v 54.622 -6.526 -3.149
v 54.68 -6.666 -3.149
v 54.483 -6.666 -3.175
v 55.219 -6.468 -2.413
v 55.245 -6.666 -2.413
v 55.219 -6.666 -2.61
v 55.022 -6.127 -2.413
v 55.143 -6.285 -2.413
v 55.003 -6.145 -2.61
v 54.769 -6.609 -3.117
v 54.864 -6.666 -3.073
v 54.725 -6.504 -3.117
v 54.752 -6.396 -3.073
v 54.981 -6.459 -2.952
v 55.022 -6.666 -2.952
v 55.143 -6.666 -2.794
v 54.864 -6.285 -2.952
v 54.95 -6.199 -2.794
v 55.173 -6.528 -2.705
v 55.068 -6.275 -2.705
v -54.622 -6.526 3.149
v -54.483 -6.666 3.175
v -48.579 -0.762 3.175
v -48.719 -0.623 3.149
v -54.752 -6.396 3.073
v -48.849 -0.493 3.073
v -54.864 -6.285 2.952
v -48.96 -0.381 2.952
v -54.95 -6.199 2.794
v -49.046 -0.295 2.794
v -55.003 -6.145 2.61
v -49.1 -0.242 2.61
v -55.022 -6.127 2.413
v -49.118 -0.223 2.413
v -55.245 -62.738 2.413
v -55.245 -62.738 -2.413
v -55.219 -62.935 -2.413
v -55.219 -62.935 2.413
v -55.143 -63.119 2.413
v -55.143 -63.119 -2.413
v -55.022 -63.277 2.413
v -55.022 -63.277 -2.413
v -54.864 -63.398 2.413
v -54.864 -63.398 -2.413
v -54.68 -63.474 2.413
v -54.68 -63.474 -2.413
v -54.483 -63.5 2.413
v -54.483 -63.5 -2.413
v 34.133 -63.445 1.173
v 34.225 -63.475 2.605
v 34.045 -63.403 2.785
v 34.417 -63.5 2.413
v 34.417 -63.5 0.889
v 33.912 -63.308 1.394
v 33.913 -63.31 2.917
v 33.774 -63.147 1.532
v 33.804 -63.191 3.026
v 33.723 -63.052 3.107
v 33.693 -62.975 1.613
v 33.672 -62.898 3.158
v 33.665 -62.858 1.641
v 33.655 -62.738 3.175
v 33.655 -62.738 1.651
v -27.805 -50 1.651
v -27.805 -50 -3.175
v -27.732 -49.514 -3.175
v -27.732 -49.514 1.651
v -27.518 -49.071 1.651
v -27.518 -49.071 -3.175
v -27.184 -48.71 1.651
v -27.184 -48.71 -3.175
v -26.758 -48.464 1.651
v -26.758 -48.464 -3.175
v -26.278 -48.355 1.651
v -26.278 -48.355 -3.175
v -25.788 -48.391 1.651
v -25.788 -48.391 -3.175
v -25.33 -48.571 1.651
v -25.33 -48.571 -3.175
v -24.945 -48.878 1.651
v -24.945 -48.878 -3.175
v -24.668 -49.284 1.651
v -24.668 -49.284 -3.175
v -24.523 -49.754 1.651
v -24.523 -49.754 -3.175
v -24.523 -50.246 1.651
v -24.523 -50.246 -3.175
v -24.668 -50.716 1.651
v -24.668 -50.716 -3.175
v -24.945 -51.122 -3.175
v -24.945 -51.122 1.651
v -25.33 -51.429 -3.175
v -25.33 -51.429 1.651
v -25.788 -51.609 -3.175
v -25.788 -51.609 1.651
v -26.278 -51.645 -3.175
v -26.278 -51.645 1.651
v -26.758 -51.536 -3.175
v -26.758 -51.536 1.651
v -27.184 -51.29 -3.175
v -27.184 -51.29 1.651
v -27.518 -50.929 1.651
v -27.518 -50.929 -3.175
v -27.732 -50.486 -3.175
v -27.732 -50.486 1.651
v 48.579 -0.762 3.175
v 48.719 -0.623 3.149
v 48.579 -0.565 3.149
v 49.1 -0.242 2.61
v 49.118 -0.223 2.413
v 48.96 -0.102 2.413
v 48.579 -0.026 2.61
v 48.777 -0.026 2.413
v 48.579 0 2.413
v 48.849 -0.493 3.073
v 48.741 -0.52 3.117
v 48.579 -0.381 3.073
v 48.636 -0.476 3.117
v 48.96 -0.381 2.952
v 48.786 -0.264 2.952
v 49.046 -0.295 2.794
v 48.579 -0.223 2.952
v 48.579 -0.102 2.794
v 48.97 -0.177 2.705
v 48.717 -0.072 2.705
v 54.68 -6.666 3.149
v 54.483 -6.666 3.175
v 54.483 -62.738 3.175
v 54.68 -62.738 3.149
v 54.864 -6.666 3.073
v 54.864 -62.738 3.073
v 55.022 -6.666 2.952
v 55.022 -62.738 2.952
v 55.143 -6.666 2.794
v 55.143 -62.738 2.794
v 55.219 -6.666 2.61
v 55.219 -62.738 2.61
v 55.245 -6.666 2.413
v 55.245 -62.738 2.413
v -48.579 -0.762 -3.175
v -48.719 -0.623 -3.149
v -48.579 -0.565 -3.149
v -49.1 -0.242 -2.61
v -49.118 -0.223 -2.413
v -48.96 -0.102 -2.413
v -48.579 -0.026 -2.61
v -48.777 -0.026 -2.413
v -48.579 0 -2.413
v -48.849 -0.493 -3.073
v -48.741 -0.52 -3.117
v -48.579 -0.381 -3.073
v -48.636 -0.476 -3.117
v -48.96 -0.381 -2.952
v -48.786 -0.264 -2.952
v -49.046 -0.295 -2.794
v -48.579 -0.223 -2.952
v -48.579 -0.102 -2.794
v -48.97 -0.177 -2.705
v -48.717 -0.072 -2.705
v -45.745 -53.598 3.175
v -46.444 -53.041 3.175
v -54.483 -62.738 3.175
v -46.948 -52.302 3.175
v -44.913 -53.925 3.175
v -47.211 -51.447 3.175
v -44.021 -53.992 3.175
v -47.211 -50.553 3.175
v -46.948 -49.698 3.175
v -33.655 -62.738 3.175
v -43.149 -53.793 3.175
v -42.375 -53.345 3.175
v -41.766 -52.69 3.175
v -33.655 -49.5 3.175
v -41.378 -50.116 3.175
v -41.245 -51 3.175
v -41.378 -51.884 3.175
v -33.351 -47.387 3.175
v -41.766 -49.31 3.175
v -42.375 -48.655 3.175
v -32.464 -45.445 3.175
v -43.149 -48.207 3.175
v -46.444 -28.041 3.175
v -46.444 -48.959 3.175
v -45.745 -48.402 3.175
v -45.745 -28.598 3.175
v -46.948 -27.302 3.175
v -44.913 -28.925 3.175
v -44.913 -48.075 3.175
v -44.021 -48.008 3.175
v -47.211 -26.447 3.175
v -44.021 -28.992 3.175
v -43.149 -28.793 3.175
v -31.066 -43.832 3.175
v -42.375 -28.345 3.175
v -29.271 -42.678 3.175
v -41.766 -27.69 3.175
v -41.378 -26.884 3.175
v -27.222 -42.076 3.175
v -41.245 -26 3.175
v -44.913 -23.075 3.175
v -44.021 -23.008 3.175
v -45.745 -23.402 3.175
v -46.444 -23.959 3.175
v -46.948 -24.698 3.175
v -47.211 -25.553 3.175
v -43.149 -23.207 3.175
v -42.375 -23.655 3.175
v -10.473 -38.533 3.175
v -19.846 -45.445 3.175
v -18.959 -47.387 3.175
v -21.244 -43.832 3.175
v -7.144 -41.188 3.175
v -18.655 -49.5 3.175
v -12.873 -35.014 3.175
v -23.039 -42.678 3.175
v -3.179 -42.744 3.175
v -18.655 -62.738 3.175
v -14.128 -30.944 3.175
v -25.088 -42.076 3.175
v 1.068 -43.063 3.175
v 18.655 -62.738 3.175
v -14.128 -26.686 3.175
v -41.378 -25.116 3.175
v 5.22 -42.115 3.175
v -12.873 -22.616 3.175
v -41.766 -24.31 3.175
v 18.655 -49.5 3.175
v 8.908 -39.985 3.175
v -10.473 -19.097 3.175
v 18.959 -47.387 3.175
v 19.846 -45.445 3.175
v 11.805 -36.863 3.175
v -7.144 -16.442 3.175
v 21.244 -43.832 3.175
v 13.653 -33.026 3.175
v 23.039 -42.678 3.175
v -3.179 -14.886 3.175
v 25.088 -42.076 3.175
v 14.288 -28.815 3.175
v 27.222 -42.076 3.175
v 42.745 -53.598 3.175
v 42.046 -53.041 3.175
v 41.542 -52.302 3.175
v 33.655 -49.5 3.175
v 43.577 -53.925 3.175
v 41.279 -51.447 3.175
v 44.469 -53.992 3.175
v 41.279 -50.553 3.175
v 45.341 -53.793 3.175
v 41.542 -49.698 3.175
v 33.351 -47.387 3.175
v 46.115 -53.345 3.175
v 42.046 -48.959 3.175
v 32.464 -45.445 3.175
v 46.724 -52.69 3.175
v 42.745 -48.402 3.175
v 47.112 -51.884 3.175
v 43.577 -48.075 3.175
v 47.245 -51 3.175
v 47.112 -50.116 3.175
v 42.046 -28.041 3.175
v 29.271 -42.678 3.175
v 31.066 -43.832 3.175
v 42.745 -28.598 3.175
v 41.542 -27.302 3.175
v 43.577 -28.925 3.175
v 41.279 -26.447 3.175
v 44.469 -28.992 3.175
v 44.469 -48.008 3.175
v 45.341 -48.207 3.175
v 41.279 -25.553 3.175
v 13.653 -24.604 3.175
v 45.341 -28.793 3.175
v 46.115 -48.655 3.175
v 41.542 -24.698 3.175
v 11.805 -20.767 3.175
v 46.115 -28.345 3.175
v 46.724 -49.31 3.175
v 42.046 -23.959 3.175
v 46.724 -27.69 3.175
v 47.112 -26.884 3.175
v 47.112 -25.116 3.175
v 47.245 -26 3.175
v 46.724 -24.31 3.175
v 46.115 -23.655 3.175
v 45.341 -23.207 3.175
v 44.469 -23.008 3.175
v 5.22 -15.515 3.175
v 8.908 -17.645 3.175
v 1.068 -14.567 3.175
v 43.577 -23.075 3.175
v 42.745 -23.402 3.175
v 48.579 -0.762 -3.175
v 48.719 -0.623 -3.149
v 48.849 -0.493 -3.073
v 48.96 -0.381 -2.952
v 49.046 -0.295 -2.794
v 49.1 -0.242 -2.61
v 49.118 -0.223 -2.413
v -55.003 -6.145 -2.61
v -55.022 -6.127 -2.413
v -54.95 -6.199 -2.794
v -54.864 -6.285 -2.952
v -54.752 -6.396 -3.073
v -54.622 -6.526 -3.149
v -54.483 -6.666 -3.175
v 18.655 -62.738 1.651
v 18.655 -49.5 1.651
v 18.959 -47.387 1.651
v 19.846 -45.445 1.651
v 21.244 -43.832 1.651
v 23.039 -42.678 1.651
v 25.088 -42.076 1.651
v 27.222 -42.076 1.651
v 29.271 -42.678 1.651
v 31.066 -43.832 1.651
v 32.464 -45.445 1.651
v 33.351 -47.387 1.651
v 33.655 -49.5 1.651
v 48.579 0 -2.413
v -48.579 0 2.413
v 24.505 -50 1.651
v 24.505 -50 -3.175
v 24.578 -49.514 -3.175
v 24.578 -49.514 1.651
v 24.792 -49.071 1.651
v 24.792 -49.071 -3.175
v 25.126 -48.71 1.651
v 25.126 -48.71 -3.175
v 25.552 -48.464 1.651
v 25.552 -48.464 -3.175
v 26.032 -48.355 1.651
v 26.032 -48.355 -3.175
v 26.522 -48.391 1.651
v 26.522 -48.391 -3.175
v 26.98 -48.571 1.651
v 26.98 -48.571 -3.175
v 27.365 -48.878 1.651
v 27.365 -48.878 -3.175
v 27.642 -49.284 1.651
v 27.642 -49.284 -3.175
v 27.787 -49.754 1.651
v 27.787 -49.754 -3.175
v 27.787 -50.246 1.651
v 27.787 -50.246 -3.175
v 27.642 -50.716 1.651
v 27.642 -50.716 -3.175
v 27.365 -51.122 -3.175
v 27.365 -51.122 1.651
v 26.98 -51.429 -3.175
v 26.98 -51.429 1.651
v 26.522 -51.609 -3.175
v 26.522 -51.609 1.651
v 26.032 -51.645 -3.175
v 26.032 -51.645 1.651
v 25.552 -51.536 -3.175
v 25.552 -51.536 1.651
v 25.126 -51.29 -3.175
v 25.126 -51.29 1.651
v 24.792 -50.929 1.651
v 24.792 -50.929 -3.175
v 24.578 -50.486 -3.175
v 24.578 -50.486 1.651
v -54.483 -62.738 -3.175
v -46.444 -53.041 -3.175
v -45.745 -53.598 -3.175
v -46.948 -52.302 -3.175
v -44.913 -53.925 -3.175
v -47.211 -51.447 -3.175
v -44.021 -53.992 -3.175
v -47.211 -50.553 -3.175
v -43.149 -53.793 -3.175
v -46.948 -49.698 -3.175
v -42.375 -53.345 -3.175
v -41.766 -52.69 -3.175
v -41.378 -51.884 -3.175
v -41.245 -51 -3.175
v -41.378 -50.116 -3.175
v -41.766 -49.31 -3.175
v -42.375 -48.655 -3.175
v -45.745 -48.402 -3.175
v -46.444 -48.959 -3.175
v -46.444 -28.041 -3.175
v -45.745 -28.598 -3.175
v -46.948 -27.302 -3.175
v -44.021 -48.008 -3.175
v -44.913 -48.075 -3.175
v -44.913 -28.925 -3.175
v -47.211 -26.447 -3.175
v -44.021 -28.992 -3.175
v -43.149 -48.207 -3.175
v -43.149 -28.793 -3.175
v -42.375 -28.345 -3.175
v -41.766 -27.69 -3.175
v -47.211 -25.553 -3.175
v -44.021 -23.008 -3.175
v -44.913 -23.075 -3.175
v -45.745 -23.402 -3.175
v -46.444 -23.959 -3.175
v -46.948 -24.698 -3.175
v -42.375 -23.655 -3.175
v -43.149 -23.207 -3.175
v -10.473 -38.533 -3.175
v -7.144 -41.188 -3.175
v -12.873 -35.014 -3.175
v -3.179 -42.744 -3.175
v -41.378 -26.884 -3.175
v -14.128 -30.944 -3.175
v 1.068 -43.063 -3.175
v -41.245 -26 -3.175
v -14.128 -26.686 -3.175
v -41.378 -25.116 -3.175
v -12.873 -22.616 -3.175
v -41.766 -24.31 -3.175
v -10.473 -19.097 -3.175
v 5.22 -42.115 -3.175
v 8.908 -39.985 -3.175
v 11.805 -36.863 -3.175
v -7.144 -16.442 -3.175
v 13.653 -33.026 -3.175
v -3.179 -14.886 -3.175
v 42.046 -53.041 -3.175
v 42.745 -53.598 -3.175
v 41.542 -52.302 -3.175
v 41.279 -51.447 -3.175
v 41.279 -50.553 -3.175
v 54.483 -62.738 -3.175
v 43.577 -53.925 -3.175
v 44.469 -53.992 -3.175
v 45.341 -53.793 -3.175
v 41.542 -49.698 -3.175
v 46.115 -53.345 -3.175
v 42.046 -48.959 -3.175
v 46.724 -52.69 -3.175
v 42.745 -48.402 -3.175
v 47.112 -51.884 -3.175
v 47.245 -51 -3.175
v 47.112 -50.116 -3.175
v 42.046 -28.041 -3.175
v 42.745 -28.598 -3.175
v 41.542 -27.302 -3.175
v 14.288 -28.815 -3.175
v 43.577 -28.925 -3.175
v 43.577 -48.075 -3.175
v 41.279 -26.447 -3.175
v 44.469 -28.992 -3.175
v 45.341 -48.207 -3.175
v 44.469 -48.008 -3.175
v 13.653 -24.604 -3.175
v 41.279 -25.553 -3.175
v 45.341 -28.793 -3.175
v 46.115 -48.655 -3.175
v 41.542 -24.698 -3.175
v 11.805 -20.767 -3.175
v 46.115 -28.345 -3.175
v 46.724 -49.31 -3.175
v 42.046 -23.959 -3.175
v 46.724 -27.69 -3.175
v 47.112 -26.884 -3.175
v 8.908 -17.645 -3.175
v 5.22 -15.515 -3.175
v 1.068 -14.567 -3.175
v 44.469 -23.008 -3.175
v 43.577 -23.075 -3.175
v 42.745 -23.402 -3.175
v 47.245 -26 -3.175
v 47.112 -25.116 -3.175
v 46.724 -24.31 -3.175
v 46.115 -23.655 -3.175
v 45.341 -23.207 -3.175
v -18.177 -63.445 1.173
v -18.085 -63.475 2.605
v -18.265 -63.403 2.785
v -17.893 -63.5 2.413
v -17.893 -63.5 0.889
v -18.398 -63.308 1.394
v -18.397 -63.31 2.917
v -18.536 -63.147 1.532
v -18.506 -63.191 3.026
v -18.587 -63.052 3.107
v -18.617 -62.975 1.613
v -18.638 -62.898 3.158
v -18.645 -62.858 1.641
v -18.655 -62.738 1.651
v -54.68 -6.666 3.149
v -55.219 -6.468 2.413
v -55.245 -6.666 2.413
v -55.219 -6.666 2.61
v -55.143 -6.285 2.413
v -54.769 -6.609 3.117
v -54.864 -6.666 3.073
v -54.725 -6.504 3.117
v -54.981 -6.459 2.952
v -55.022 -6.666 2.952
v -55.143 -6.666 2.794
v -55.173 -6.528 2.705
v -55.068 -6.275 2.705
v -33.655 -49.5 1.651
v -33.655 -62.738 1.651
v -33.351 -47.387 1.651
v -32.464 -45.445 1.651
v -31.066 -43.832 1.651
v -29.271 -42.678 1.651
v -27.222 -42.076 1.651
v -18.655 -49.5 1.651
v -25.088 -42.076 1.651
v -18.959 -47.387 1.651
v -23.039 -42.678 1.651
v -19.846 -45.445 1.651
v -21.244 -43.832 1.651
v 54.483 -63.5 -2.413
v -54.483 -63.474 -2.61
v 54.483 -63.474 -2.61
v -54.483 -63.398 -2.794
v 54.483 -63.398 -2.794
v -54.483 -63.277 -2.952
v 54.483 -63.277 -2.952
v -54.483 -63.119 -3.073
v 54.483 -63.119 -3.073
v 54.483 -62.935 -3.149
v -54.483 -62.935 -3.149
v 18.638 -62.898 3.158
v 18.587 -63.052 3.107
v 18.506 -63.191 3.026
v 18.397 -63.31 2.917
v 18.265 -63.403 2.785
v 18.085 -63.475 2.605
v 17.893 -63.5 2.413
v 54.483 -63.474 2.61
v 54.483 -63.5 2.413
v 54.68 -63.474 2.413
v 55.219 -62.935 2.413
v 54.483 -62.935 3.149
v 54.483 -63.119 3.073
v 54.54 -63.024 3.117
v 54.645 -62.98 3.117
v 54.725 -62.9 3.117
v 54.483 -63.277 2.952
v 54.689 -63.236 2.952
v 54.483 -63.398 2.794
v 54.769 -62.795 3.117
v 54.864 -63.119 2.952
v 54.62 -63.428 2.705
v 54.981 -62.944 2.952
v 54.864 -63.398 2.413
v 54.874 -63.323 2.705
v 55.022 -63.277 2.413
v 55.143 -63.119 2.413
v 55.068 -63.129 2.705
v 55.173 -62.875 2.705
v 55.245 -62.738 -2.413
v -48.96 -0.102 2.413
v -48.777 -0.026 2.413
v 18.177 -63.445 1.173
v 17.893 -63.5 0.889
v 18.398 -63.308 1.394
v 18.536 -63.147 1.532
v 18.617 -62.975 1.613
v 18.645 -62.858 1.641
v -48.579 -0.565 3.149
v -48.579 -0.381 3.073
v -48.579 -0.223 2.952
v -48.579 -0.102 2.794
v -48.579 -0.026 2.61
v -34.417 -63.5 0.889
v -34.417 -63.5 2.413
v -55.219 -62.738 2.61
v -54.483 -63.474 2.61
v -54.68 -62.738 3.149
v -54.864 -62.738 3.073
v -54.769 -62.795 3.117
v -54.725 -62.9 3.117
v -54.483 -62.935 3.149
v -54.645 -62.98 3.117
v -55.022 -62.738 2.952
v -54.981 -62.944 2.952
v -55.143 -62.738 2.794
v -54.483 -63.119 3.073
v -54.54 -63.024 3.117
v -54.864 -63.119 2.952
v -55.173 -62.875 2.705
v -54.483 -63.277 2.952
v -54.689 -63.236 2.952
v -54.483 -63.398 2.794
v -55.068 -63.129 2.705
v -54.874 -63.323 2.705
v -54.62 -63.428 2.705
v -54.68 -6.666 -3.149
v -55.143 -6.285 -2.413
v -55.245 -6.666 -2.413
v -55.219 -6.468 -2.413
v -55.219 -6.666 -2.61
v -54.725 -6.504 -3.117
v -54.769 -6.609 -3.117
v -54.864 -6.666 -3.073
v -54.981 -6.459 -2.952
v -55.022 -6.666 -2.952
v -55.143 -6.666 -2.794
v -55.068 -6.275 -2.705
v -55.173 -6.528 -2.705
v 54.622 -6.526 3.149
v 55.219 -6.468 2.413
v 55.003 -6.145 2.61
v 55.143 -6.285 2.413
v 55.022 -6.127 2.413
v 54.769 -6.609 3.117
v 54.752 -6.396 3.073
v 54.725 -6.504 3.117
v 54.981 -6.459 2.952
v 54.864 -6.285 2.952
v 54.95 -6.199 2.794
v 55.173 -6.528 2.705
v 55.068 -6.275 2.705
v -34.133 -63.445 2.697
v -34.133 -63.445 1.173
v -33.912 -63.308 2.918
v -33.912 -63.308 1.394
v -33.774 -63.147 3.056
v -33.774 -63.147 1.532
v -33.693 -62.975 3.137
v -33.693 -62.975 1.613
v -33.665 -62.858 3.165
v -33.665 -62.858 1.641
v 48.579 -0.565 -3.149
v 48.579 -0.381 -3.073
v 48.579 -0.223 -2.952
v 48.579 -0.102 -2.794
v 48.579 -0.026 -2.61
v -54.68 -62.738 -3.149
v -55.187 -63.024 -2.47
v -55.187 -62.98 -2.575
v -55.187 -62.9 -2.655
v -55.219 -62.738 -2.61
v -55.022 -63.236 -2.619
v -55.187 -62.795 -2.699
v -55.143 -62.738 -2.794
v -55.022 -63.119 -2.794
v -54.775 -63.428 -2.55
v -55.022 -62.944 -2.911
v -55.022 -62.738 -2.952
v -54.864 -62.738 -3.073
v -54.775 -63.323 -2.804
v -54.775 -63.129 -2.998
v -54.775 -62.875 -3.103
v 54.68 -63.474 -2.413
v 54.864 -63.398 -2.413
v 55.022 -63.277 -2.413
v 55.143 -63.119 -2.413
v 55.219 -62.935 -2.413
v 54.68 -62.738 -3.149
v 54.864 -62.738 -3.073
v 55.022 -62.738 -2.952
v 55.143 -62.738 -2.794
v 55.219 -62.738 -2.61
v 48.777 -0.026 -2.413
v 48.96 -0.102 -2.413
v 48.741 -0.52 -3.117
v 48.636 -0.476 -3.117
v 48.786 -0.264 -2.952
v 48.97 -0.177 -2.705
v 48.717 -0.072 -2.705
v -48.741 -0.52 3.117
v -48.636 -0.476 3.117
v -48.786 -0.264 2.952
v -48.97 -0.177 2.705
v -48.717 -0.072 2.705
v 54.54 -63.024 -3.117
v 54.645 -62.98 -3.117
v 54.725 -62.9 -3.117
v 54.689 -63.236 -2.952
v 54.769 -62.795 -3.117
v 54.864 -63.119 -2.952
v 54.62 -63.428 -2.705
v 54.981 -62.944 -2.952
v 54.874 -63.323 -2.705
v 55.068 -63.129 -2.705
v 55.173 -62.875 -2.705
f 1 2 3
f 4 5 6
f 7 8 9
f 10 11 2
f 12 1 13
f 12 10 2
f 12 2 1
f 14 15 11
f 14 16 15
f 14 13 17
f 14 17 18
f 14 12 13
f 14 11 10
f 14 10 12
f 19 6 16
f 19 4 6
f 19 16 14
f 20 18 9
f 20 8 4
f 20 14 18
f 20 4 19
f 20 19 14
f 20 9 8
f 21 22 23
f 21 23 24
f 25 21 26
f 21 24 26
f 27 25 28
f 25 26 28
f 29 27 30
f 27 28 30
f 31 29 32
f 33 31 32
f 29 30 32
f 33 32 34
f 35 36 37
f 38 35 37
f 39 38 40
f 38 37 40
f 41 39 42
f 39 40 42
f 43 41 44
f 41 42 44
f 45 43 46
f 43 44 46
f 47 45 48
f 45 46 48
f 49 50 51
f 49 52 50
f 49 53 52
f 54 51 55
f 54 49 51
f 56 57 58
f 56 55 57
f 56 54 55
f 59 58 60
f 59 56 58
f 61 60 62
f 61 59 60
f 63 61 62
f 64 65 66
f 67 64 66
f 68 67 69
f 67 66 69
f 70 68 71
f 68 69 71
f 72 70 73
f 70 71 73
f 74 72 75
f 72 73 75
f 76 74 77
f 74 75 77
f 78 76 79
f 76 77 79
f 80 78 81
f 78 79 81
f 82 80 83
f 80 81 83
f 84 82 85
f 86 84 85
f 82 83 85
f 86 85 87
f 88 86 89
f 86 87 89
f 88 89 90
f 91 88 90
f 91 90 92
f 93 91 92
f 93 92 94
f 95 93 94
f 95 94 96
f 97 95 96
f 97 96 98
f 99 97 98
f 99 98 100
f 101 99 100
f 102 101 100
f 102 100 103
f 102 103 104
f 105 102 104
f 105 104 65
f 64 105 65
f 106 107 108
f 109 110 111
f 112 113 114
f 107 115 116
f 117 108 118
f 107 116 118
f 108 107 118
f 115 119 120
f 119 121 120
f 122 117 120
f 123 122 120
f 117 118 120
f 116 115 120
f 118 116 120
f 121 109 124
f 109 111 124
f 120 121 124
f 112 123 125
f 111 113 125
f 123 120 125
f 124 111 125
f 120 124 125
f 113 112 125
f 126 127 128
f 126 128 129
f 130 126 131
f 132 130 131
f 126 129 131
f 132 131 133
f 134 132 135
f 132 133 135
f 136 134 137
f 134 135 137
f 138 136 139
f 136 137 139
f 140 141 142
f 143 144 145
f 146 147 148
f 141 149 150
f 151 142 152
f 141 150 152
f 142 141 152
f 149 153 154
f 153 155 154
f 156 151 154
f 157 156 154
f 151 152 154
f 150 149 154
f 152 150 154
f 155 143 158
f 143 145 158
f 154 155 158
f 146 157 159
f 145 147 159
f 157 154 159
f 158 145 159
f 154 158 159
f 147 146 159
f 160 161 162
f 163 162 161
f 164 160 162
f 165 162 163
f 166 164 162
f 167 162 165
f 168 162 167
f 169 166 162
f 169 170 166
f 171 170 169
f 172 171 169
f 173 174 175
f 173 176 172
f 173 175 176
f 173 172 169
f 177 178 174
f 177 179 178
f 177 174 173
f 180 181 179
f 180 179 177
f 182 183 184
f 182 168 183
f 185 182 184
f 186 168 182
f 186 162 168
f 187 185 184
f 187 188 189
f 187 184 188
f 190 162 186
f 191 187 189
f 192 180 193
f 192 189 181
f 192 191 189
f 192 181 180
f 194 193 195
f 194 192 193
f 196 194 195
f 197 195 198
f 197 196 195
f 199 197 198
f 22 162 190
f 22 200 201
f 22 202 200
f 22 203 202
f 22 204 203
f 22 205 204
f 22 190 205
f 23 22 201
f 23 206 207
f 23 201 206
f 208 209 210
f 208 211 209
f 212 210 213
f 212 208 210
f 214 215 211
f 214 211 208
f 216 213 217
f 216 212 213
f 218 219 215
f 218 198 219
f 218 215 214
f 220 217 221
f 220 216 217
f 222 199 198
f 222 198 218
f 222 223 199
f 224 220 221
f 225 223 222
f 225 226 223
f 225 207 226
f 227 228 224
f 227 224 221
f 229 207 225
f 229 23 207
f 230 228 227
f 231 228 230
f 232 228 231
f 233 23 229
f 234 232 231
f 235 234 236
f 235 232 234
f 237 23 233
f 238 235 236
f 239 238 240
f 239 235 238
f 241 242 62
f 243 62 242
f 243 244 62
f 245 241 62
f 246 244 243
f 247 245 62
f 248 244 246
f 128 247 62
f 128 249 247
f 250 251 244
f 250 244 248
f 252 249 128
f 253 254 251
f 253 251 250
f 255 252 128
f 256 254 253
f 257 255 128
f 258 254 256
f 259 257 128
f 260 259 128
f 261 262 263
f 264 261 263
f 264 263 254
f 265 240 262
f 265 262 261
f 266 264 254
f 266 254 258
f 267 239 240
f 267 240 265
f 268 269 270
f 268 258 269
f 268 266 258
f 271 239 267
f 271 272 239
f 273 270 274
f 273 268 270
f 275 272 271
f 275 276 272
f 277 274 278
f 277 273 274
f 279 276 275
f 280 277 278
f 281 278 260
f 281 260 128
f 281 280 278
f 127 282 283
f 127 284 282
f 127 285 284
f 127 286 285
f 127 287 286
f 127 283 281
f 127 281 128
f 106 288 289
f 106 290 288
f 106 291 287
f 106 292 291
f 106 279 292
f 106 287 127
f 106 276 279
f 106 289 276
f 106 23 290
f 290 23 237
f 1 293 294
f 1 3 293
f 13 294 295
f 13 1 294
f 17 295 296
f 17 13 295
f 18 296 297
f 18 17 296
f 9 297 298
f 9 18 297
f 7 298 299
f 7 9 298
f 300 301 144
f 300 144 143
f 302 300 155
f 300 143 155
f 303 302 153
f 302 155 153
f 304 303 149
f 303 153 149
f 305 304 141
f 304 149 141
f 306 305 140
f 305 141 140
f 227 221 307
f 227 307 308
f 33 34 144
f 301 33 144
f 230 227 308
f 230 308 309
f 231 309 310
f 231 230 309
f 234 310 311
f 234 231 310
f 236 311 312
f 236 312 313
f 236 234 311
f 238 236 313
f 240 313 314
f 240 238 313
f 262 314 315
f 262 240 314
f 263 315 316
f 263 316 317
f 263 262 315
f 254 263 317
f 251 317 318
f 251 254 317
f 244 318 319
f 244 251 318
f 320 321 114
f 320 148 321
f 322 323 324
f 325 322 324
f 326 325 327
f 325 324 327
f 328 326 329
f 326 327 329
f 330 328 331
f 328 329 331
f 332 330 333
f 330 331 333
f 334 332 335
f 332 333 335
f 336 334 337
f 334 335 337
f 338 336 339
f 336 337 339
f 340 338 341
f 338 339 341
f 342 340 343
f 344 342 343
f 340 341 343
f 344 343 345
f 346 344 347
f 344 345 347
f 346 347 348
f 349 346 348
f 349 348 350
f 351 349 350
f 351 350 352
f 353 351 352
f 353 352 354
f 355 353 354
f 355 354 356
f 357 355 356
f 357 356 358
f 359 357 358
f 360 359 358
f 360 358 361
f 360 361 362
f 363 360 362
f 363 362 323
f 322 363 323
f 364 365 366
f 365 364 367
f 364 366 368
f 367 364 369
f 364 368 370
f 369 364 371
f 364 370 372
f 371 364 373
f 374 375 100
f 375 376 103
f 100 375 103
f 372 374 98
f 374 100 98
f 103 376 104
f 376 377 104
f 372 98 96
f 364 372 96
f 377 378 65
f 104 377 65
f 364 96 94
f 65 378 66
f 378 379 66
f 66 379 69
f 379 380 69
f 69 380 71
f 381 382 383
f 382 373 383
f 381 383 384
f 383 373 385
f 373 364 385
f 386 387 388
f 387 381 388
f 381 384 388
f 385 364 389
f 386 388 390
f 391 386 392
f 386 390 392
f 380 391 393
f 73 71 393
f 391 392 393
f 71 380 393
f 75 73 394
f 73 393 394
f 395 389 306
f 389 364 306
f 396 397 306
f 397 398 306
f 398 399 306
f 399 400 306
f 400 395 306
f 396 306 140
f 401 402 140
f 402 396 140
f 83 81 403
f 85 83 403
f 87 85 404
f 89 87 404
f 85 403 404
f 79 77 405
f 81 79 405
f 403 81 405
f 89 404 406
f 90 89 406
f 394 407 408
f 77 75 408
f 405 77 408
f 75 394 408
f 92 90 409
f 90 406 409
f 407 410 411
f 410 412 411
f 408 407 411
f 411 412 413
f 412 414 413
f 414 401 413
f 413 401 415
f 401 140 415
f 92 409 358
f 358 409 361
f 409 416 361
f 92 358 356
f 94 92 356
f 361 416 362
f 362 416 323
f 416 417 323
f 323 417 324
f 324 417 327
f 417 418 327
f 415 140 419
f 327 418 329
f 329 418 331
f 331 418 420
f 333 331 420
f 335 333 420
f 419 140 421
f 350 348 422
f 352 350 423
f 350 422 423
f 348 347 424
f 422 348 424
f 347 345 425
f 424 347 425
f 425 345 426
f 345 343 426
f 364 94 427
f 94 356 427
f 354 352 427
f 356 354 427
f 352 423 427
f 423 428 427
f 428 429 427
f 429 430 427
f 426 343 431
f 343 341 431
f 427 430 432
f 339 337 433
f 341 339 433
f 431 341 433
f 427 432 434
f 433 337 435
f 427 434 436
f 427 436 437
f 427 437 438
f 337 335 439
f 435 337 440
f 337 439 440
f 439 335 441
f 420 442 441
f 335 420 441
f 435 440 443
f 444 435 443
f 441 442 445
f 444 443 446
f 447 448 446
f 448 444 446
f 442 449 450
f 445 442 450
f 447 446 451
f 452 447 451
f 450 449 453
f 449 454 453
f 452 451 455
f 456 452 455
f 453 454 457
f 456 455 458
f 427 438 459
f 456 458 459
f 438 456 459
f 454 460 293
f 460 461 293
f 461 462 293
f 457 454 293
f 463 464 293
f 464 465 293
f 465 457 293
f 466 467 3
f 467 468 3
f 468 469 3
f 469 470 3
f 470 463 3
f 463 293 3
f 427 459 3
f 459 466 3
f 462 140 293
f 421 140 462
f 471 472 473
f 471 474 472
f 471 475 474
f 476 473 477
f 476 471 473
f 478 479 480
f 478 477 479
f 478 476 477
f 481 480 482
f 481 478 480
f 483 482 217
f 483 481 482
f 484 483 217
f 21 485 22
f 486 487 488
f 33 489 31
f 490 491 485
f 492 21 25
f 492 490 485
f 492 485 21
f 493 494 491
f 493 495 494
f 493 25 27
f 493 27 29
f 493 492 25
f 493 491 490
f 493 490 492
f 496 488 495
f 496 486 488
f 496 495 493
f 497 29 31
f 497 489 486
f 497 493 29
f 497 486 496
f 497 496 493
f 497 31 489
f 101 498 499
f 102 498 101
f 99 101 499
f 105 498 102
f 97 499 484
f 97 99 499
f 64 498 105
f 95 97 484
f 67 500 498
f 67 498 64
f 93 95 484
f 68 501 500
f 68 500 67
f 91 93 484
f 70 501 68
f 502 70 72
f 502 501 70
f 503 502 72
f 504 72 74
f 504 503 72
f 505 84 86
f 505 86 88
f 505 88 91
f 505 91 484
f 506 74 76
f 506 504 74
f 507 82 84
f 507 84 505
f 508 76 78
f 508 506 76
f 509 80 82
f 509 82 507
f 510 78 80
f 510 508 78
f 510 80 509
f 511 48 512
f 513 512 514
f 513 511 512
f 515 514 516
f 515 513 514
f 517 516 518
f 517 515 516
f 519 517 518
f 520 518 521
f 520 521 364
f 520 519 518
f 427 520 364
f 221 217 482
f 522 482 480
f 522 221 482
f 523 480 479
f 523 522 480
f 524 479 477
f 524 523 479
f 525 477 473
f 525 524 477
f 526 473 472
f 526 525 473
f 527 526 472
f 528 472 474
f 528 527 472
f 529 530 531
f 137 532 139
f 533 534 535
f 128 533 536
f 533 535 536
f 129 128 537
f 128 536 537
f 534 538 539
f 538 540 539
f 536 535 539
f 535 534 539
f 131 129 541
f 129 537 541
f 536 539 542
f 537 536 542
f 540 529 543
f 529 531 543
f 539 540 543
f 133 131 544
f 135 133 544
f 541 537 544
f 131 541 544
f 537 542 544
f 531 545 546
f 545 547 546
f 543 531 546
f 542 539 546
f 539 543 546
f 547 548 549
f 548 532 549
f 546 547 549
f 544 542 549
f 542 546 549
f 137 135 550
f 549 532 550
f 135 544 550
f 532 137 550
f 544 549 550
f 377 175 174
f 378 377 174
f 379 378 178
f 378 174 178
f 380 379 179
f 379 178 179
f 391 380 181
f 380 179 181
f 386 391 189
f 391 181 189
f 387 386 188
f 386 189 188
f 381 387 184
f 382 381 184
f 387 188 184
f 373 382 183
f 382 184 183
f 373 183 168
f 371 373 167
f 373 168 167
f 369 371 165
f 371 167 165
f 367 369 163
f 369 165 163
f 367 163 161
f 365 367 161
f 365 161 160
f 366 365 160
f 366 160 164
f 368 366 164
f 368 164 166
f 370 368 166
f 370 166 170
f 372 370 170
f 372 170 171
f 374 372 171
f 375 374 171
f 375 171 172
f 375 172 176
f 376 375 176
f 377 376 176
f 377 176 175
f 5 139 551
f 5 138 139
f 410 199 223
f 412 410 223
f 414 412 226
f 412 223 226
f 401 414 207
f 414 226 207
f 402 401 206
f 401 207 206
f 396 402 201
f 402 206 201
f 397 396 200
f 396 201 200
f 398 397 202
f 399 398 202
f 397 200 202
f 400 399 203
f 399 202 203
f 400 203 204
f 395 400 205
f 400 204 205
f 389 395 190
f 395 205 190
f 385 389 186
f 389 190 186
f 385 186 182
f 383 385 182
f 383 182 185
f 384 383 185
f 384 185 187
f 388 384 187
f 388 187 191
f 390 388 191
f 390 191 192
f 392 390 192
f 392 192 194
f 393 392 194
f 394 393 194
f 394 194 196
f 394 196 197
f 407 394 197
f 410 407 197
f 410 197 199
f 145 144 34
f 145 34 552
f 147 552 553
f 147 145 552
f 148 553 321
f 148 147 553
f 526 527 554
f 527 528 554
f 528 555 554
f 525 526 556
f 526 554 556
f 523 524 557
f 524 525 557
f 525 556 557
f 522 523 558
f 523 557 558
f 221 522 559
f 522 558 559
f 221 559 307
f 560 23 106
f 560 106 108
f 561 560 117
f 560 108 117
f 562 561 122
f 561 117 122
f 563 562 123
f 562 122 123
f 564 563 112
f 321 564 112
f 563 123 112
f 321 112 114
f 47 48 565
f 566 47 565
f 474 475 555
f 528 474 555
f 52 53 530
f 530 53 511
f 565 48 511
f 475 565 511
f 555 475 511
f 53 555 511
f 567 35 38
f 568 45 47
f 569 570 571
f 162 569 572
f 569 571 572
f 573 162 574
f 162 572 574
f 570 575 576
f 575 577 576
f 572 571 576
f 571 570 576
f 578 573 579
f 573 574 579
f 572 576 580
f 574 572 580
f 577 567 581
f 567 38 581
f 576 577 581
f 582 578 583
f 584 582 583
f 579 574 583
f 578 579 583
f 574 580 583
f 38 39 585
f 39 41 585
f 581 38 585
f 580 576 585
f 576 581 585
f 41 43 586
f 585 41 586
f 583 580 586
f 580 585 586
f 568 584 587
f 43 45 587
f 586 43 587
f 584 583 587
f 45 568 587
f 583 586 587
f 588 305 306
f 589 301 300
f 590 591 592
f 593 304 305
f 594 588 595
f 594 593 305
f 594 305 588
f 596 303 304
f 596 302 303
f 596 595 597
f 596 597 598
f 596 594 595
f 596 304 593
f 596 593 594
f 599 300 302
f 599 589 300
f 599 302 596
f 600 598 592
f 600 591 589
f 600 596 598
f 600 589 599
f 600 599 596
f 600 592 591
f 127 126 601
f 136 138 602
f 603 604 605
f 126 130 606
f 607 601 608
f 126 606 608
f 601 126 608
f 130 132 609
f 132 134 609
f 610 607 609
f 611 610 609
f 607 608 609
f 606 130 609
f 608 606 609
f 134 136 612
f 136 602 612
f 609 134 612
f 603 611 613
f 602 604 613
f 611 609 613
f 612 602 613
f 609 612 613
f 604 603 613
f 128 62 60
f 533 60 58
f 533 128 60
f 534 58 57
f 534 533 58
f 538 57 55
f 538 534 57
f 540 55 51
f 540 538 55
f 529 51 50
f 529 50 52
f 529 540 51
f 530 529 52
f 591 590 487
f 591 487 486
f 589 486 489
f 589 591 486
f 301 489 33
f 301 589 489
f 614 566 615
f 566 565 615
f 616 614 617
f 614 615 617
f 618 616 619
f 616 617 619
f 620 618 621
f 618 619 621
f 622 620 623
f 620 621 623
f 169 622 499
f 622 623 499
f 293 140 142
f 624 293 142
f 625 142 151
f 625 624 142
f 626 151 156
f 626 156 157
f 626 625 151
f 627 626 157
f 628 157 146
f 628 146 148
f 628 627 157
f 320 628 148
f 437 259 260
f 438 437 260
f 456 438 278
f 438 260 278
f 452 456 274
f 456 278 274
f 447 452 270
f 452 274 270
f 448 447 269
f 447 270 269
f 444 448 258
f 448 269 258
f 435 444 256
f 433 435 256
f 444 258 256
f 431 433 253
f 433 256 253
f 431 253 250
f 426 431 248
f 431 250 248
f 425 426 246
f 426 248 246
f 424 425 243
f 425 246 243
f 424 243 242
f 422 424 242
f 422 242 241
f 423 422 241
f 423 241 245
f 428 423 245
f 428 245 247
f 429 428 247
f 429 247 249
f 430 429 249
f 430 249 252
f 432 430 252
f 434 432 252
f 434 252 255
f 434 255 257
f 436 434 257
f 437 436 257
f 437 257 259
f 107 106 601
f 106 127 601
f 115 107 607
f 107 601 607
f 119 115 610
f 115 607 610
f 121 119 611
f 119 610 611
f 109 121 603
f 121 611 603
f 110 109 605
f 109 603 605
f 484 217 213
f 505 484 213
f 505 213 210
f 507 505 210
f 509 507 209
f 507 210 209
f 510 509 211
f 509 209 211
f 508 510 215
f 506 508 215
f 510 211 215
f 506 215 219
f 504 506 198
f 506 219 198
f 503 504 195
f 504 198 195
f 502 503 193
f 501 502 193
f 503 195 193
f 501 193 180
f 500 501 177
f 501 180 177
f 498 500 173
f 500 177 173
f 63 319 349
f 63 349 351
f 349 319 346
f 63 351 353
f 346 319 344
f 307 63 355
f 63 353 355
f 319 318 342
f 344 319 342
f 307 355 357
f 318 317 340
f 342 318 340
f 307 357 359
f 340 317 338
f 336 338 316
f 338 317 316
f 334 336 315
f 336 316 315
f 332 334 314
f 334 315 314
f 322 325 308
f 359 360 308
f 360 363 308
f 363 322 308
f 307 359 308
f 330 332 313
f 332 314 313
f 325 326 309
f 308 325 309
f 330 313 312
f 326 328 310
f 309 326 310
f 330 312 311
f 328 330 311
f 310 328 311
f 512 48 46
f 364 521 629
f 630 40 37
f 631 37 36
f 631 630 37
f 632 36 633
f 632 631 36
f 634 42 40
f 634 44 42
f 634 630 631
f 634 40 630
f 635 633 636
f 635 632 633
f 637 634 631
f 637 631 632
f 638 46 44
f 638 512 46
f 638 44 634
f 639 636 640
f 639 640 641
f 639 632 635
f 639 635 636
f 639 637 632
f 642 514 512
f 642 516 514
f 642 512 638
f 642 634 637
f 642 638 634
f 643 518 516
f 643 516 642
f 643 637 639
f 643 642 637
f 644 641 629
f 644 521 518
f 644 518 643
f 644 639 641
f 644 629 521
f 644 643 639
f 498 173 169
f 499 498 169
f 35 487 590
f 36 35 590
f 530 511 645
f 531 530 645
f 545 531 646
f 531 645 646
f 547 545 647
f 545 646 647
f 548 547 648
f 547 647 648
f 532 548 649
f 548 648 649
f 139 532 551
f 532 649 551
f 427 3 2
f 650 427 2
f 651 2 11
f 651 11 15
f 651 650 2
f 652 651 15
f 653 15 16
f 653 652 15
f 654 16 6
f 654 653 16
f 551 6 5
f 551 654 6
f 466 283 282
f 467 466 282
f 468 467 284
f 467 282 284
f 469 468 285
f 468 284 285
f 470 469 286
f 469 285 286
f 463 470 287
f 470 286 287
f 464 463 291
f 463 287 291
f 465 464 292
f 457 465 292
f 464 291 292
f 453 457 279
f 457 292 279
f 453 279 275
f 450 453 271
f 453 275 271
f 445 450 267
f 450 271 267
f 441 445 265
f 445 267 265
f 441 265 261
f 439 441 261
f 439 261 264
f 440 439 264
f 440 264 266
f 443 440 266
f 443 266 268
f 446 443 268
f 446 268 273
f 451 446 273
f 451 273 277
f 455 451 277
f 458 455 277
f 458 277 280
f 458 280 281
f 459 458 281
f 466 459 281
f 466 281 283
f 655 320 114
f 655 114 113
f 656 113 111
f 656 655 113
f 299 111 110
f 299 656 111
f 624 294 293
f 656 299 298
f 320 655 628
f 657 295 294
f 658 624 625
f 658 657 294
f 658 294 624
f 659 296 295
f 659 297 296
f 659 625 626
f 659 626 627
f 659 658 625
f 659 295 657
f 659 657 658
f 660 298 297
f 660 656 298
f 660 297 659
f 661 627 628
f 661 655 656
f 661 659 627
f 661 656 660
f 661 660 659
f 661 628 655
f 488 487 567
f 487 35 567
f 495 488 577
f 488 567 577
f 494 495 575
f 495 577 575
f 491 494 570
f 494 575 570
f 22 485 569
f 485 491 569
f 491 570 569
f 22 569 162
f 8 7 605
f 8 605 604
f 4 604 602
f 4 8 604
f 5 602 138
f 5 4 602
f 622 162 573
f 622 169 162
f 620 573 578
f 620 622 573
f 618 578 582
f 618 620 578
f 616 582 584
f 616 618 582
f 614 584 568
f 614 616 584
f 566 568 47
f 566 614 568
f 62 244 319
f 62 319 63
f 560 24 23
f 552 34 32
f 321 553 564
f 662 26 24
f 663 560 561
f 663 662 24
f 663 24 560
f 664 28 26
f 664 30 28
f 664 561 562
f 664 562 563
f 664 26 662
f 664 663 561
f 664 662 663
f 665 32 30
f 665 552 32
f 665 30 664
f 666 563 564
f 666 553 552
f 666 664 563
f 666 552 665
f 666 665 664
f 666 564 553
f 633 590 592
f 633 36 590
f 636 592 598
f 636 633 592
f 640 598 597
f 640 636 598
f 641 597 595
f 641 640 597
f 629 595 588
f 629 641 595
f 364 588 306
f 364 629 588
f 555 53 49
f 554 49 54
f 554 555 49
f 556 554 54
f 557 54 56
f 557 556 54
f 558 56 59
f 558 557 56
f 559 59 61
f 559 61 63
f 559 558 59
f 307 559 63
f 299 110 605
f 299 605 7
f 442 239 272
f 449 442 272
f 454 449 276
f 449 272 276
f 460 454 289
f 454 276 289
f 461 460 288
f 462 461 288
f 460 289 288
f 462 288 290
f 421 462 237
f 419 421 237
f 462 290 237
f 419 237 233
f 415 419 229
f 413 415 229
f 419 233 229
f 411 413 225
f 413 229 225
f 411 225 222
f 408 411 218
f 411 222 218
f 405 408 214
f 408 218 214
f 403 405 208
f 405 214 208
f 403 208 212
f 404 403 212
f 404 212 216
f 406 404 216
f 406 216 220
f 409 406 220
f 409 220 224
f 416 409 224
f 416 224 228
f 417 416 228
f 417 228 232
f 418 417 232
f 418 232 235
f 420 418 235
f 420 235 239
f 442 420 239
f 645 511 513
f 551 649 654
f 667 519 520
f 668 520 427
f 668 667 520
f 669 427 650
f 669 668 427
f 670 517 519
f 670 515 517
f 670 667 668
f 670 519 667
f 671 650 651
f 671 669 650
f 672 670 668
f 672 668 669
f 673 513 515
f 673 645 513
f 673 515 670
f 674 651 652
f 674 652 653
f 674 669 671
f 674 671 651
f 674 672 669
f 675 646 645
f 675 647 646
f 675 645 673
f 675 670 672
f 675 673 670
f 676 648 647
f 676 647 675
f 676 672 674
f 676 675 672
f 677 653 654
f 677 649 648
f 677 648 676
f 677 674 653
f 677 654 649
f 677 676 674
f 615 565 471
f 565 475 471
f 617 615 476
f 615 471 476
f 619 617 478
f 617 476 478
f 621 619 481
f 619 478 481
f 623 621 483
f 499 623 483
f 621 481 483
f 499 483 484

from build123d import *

# Parameters (mm, degrees)
SKETCH2_W                   = 110.49
SKETCH2_H                   = 6.35
BOSS_EXTRUDE1_DEPTH         = 63.5
SKETCH3_R                   = 14.2875
CUT_EXTRUDE1_DEPTH          = 85.407242136
CHAMFER1_SIZE               = 6.35
CUT_EXTRUDE2_DEPTH          = 1.524
TAP_DRILL_FOR_M4X0_7_TAP1_D = 3.3
TAP_DRILL_FOR_M7X1_0_TAP1_D = 6
FILLET2_R                   = 0.762


with BuildPart() as part:
    # Sketch2 → Boss-Extrude1 (new body)
    with BuildSketch(Plane(origin=(0, 0, 0), x_dir=(1, 0, 0), z_dir=(0, 1, 0))):
        Rectangle(SKETCH2_W, SKETCH2_H)
    extrude(amount=-BOSS_EXTRUDE1_DEPTH)

    # Sketch3 → Cut-Extrude1 (cut, through all)
    with BuildSketch(Plane.XY.offset(3.175)):
        with Locations((0, -28.8150046)):
            Circle(SKETCH3_R)
    extrude(amount=-CUT_EXTRUDE1_DEPTH, mode=Mode.SUBTRACT)

    # Chamfer1
    chamfer1_edges = [part.edges().sort_by_distance(p)[0] for p in [
        (55.245, 0, 0),
        (-55.245, 0, 0),
    ]]
    chamfer(chamfer1_edges, length=CHAMFER1_SIZE)

    # Sketch12 → Cut-Extrude2 (cut)
    with BuildSketch(Plane.XY.offset(3.175)):
        with BuildLine():
            Line((-33.655, -49.5), (-33.655, -63.5))
            Line((-33.655, -63.5), (-18.655, -63.5))
            Line((-18.655, -63.5), (-18.655, -49.5))
            ThreePointArc((-18.655, -49.5), (-26.155, -42), (-33.655, -49.5))
        make_face()
    cut_extrude2 = extrude(amount=-CUT_EXTRUDE2_DEPTH, mode=Mode.SUBTRACT)

    # Mirror1: Cut-Extrude2 across plane
    add(cut_extrude2.mirror(Plane(origin=(0, 0, 0), x_dir=(0, 0, 1), z_dir=(1, 0, 0))), mode=Mode.SUBTRACT)

    # Tap Drill for M4x0.7 Tap1 (through all)
    with Locations(Plane.XY.offset(3.175)):
        with Locations((-26.155, -50), (26.155, -50)):
            Hole(TAP_DRILL_FOR_M4X0_7_TAP1_D / 2)

    # Tap Drill for M7x1.0 Tap1 (through all)
    with Locations(Plane(origin=(0, 0, -3.175), x_dir=(-1, 0, 0), z_dir=(0, 0, -1))):
        with Locations((44.245, -26), (44.245, -51), (-44.245, -51), (-44.245, -26)):
            Hole(TAP_DRILL_FOR_M7X1_0_TAP1_D / 2)

    # Fillet2
    fillet2_edges = [part.edges().sort_by_distance(p)[0] for p in [
        (55.245, -63.5, 0),
        (0, -63.5, -3.175),
        (0, 0, 3.175),
        (0, 0, -3.175),
        (48.895, 0, 0),
        (-48.895, 0, 0),
        (52.07, -3.175, 3.175),
        (-52.07, -3.175, 3.175),
        (-55.245, -6.35, 0),
        (52.07, -3.175, -3.175),
        (-52.07, -3.175, -3.175),
        (55.245, -6.35, 0),
        (0, -63.5, 3.175),
        (-26.155, -63.5, 1.651),
        (-18.655, -63.5, 2.413),
        (-33.655, -63.5, 2.413),
        (44.45, -63.5, 3.175),
        (-55.245, -63.5, 0),
        (33.655, -63.5, 2.413),
        (18.655, -63.5, 2.413),
        (26.155, -63.5, 1.651),
        (-55.245, -34.925, -3.175),
        (55.245, -34.925, -3.175),
        (55.245, -34.925, 3.175),
        (-55.245, -34.925, 3.175),
        (-44.45, -63.5, 3.175),
    ]]
    fillet(fillet2_edges, radius=FILLET2_R)


solid = part.part
